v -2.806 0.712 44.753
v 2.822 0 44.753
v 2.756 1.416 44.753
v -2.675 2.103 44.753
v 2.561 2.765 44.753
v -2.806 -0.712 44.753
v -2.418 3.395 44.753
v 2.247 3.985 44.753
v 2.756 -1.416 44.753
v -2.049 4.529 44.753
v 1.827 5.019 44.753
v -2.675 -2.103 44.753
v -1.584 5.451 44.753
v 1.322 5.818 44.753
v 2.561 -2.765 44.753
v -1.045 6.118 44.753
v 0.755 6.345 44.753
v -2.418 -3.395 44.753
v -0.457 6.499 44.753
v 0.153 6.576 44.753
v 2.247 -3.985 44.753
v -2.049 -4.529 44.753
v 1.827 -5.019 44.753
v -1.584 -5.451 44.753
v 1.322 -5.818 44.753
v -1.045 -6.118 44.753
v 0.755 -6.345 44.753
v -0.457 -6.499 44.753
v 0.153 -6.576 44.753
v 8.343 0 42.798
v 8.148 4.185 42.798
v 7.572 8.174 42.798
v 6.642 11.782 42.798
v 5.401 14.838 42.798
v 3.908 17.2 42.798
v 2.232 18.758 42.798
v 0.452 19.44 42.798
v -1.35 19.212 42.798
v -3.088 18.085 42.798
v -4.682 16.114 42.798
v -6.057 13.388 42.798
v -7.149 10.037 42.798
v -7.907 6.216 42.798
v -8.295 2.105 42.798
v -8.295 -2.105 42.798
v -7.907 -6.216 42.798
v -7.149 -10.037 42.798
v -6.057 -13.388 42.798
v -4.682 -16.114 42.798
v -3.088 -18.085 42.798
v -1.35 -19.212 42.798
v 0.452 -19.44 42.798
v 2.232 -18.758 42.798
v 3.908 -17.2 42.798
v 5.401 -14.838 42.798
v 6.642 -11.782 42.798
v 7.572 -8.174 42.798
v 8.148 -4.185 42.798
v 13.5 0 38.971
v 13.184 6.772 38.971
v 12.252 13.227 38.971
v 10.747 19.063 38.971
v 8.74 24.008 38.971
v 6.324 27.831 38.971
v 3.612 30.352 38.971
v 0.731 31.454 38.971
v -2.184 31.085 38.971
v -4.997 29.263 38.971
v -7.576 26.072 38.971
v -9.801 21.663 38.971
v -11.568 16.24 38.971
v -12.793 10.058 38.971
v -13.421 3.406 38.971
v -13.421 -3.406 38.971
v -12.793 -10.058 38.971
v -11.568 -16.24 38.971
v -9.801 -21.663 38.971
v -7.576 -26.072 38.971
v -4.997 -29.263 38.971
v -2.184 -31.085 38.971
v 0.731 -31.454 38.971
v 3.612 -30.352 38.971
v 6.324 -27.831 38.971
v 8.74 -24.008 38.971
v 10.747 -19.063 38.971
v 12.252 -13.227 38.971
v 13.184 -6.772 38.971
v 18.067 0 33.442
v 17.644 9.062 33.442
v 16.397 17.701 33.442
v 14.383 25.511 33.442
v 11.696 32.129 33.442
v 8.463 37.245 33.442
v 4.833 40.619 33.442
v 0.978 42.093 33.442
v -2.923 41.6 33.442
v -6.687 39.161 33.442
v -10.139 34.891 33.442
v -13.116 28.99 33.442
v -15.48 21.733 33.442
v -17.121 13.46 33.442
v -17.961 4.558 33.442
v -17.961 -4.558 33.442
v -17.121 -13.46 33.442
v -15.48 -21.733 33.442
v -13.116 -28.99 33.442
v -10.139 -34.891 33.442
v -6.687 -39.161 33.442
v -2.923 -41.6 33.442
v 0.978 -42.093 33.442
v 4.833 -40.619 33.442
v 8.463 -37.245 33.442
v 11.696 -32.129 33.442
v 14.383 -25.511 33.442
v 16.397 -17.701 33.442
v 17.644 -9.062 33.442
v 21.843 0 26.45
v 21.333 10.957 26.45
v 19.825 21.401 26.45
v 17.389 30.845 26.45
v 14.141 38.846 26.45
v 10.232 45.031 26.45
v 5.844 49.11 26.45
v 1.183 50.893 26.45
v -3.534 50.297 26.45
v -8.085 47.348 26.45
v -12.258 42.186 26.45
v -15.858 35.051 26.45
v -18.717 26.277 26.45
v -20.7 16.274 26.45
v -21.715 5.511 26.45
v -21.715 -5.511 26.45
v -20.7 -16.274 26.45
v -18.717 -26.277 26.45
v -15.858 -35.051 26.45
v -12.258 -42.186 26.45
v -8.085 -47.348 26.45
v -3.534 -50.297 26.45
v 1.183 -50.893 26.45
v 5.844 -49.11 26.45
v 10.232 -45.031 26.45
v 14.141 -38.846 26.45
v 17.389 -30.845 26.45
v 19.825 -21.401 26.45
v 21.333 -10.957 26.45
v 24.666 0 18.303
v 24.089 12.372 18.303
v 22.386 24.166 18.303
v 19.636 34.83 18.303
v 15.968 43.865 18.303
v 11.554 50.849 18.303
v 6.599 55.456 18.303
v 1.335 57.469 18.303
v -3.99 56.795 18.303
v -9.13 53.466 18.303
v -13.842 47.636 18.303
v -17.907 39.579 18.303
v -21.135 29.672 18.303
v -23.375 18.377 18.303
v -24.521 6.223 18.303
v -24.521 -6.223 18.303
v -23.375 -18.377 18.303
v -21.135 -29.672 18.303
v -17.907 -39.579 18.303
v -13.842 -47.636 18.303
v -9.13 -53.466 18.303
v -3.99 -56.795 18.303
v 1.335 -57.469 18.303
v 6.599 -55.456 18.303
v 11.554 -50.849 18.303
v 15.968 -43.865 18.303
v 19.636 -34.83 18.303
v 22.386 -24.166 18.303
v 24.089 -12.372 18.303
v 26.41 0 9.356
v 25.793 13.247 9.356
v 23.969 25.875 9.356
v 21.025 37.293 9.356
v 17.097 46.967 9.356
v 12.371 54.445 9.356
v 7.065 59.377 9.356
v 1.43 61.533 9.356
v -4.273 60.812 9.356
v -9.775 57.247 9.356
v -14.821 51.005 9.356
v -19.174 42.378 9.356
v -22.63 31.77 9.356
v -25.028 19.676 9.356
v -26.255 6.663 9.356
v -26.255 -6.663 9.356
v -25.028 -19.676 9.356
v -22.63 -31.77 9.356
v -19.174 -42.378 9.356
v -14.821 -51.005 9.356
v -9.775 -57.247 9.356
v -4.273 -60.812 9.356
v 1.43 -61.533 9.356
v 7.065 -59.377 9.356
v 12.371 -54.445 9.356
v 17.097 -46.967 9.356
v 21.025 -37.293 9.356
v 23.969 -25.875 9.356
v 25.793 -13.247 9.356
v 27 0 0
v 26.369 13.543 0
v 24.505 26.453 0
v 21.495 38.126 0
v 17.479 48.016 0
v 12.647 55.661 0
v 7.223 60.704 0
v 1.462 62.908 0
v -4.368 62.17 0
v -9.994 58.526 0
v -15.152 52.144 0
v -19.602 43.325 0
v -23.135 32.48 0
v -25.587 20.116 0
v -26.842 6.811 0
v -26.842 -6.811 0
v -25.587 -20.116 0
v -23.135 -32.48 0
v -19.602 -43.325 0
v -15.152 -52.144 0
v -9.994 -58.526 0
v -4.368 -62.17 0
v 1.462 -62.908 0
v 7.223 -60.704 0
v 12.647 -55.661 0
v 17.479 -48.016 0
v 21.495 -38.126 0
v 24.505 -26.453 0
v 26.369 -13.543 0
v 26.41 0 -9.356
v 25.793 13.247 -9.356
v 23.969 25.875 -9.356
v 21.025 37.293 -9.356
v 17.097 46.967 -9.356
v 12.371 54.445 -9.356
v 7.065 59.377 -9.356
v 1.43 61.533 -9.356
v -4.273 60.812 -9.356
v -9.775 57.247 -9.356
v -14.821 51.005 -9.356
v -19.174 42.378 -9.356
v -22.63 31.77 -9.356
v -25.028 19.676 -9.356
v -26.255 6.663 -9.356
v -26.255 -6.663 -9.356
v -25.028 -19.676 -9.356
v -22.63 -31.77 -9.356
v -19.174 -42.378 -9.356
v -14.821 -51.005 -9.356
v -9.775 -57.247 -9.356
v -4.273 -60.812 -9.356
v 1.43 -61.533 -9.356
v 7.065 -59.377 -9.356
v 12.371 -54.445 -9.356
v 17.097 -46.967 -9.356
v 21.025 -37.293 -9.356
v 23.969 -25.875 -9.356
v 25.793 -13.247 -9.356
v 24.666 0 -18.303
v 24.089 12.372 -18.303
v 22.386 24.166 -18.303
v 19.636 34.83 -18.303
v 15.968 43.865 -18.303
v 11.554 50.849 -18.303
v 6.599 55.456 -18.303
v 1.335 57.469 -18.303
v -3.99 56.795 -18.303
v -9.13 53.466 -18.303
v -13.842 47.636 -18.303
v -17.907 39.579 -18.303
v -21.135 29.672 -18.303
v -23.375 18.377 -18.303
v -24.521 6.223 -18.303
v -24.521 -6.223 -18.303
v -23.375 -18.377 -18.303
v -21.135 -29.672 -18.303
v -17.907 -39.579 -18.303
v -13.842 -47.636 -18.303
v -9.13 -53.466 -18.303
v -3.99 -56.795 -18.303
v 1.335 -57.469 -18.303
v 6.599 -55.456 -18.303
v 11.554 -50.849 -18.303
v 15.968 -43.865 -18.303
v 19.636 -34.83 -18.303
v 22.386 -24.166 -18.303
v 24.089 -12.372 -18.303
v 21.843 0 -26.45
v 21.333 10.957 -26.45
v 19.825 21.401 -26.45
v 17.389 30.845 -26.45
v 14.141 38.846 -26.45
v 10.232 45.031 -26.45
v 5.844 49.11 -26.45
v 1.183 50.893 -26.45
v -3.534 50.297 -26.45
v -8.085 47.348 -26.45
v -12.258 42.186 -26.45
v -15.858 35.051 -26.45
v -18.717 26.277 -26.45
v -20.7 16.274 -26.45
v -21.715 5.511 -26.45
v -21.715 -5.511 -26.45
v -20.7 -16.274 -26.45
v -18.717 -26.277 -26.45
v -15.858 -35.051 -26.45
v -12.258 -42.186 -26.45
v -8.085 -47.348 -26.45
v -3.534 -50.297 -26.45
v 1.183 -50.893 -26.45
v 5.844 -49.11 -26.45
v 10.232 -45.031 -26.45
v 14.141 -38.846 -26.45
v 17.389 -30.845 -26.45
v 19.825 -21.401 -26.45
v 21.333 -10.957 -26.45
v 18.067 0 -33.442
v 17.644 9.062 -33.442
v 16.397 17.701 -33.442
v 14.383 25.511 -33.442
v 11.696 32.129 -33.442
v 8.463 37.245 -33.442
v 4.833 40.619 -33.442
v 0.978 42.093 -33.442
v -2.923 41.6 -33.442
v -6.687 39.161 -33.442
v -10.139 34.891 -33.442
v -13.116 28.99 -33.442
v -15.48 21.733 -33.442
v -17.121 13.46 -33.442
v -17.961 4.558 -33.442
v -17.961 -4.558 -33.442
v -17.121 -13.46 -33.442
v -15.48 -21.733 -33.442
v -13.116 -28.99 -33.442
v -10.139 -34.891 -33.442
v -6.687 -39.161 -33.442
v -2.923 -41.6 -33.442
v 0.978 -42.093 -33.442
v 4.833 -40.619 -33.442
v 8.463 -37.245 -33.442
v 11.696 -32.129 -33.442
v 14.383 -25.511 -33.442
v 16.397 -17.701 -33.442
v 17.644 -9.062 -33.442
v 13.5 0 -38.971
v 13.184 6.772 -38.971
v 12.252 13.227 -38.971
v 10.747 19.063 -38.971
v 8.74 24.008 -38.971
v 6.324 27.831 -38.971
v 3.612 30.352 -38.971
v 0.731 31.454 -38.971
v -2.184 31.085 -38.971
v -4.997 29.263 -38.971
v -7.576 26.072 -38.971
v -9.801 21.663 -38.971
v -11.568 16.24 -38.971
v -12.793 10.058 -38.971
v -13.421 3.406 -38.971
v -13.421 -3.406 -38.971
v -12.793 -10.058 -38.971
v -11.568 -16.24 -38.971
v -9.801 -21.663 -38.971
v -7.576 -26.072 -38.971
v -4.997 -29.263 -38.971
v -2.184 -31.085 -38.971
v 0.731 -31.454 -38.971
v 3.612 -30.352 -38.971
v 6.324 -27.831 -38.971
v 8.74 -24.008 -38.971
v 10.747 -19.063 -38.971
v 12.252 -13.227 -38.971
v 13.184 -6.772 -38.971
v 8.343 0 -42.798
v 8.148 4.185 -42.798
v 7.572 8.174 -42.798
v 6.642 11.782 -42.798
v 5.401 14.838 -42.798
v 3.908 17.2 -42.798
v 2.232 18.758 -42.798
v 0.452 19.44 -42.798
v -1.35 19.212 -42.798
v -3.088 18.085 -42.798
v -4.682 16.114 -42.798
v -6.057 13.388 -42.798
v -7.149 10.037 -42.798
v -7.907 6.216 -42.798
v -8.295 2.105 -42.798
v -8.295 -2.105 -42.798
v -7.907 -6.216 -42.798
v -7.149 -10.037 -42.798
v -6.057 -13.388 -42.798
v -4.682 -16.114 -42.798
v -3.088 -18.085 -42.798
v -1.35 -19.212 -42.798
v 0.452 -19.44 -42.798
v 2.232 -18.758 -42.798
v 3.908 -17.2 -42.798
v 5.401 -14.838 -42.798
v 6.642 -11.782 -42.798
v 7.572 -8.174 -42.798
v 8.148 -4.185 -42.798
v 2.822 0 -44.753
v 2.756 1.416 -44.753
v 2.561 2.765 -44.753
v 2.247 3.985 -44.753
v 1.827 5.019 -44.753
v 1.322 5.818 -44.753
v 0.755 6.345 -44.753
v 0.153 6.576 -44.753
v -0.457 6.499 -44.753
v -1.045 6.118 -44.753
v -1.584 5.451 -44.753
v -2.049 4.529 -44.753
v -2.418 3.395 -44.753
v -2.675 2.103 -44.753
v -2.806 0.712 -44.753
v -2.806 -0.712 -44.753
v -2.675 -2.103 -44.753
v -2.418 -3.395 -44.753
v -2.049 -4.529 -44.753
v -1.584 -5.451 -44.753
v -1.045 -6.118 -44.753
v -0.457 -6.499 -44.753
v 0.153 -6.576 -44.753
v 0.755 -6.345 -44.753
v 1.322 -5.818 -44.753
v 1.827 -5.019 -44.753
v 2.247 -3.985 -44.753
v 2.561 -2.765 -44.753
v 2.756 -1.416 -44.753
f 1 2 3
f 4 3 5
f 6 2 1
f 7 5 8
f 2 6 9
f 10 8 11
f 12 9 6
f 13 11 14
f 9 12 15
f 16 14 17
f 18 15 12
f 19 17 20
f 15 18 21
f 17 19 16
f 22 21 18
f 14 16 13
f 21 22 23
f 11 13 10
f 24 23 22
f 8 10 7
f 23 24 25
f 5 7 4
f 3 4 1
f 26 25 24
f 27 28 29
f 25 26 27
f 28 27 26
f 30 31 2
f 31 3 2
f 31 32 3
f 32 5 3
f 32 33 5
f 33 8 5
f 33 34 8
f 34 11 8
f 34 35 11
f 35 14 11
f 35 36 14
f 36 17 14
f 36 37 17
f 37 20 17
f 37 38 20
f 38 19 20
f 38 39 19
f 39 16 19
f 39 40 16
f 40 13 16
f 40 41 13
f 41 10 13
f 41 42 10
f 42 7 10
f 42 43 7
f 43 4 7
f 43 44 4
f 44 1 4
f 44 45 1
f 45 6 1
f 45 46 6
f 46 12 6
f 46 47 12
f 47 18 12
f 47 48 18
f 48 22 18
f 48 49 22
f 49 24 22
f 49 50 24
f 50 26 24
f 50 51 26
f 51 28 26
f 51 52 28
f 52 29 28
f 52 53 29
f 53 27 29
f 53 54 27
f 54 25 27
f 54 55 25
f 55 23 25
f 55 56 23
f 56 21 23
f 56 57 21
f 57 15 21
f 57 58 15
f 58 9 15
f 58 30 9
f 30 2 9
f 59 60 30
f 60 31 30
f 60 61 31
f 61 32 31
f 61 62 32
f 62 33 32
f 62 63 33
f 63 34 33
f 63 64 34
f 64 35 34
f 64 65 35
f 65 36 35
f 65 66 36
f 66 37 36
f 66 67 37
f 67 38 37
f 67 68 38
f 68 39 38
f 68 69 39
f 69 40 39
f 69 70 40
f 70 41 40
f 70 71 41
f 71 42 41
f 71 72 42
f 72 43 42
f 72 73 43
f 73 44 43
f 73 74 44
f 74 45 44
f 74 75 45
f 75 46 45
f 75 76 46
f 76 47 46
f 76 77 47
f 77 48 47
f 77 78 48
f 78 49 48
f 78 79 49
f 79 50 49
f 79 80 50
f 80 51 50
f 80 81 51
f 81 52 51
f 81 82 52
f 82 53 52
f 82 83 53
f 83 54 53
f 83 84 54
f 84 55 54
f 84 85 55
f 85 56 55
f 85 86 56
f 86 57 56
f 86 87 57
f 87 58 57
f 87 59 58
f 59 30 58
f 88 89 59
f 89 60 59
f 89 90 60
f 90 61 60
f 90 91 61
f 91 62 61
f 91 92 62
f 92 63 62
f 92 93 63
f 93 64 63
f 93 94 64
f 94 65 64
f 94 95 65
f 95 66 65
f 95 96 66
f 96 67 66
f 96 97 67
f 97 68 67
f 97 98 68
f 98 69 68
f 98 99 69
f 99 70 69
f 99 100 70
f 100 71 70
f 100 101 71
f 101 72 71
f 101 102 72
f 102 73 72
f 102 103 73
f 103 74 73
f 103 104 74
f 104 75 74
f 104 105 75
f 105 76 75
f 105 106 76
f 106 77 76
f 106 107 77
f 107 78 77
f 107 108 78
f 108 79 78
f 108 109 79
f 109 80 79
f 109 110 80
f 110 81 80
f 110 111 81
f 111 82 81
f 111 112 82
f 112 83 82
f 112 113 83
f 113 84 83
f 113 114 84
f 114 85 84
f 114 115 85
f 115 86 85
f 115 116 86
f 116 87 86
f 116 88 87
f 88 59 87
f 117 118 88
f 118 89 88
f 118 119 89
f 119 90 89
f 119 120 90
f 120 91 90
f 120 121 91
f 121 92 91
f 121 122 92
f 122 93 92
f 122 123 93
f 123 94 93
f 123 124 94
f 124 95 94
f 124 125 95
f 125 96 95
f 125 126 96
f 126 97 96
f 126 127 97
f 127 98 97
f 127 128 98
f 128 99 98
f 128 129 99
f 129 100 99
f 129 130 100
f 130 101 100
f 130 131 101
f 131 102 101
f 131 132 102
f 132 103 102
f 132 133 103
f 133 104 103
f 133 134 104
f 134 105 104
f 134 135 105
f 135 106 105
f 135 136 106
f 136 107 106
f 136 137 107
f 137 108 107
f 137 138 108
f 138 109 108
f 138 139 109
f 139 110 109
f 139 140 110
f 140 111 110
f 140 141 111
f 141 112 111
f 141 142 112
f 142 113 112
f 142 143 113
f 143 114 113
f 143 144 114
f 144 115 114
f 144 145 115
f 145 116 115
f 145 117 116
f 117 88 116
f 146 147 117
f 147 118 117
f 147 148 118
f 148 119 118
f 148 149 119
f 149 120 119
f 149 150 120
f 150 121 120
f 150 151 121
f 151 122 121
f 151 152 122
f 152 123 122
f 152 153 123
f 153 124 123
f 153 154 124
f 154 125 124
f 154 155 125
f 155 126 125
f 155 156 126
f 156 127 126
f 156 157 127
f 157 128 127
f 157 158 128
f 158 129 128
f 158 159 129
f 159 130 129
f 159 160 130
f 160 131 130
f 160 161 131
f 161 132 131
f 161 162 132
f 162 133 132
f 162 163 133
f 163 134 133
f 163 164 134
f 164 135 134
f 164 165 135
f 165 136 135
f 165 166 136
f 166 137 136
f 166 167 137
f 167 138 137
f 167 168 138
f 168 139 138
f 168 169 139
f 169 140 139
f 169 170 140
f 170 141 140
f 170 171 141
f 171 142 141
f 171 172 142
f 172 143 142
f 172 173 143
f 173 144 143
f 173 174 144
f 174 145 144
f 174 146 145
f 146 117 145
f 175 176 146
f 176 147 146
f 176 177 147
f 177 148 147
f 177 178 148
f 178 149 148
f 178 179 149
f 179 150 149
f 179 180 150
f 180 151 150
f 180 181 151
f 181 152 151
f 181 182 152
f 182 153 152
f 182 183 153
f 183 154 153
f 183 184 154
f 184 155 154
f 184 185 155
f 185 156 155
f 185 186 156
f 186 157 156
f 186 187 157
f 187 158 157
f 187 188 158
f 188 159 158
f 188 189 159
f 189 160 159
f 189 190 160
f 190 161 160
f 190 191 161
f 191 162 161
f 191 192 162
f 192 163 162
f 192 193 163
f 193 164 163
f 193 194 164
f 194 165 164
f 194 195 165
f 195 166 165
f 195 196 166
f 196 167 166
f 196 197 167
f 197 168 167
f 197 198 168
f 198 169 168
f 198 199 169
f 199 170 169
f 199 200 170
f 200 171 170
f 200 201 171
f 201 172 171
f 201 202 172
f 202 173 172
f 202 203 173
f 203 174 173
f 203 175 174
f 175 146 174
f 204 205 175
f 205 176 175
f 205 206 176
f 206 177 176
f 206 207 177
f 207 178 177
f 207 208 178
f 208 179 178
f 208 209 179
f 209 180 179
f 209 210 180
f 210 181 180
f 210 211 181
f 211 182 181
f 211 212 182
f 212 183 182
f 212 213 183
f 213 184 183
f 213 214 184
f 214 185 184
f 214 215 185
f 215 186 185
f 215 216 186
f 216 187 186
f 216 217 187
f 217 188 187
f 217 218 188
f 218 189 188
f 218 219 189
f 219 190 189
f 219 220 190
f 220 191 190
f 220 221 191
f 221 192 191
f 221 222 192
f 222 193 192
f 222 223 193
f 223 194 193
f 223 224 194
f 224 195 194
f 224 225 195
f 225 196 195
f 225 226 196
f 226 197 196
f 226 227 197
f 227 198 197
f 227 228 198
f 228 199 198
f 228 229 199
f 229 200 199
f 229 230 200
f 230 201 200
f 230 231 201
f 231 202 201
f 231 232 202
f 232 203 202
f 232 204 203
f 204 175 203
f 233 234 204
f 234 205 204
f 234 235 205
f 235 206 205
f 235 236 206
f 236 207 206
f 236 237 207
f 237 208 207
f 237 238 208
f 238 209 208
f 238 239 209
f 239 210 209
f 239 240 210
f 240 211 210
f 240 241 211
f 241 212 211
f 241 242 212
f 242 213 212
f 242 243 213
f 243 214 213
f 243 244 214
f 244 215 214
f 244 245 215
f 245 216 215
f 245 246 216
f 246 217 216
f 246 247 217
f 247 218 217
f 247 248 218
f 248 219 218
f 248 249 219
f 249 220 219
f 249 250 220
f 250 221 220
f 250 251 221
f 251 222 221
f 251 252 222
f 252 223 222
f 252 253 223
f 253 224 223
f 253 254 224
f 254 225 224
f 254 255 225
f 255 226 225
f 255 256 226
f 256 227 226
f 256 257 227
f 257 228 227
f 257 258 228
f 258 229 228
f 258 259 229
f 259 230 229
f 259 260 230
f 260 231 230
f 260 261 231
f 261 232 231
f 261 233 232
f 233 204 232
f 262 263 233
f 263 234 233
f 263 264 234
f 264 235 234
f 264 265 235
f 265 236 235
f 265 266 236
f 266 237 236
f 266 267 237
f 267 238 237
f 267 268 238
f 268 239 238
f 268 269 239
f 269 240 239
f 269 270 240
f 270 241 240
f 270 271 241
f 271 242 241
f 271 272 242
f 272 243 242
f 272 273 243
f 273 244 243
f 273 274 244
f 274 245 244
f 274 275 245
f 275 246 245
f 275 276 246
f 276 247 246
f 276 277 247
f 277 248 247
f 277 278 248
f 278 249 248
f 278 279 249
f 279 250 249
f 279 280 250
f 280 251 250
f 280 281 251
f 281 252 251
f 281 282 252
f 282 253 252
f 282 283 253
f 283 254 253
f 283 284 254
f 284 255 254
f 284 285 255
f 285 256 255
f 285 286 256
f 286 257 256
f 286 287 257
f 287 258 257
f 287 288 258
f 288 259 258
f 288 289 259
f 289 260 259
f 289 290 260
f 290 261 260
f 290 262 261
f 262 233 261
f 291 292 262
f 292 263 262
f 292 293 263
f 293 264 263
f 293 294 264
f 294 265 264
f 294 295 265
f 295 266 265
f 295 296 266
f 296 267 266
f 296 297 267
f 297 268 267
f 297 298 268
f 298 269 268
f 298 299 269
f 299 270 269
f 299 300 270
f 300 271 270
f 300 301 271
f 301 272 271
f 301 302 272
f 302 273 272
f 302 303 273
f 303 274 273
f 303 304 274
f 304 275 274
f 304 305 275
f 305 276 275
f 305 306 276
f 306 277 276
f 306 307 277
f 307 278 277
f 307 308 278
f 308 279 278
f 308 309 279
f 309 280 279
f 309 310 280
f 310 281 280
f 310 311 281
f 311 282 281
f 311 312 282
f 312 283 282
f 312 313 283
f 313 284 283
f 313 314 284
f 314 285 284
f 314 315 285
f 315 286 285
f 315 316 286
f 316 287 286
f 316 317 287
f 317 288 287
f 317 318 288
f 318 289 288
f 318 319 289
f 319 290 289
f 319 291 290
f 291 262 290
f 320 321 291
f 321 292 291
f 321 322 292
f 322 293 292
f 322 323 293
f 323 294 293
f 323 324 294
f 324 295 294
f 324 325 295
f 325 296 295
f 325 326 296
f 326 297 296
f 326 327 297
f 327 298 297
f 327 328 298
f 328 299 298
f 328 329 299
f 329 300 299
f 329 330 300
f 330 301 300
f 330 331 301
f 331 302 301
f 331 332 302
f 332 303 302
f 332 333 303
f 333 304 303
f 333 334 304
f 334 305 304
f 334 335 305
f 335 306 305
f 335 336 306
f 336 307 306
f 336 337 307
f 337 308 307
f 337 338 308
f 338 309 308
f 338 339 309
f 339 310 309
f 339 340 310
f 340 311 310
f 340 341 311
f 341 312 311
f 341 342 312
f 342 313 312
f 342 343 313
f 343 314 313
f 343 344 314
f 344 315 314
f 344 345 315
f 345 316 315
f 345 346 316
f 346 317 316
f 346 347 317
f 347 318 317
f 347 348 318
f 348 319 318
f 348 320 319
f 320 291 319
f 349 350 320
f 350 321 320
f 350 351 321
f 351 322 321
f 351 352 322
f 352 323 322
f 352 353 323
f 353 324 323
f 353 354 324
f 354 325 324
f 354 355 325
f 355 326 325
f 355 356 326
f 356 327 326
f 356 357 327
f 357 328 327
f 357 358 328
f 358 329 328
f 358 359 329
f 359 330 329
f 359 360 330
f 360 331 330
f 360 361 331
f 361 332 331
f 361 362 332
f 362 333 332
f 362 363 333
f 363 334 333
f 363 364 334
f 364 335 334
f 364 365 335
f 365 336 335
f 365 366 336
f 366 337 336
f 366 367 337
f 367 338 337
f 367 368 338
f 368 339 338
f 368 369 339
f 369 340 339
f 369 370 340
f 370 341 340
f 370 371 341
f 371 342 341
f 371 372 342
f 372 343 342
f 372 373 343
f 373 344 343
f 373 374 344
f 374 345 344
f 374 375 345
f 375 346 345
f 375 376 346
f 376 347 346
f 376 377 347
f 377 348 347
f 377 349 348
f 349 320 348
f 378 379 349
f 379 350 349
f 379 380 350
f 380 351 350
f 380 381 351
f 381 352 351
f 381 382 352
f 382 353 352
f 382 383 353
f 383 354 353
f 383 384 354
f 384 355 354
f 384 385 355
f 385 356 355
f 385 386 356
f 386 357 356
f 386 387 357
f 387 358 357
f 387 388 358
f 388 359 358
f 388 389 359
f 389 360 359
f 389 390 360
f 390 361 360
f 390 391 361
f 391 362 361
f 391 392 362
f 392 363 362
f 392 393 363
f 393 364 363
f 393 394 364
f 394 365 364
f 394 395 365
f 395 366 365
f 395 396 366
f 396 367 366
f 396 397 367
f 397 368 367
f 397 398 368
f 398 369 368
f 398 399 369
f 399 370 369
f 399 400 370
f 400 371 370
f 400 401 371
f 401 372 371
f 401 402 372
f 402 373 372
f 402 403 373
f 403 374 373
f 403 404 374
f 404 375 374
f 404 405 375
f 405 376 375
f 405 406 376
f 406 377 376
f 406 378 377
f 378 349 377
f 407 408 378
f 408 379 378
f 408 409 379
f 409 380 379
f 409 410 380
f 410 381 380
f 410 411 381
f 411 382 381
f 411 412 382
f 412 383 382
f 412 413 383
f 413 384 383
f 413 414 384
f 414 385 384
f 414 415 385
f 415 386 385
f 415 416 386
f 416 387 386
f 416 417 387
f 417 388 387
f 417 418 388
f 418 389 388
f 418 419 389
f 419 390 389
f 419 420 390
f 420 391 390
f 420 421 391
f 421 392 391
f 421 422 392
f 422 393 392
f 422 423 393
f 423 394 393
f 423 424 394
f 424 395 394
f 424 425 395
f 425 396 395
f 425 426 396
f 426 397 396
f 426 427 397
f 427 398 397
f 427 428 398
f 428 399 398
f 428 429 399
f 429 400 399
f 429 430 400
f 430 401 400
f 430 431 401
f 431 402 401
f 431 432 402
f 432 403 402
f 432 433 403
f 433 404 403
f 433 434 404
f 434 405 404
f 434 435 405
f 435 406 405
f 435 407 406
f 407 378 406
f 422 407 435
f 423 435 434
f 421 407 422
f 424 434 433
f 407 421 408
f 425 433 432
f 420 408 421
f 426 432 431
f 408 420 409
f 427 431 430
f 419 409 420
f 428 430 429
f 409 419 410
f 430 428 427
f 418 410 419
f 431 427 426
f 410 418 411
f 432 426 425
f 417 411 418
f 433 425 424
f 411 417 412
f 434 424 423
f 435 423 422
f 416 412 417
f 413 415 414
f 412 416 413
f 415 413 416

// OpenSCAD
// Generated by SolidPython 1.0.1 on 2020-07-29 00:46:45


scale(v = [3, 7, 5]) {
	sphere(r = 9);
}
/***********************************************
*********      SolidPython code:      **********
************************************************
 
# import packages: SolidPython
from solid import *
from solid.utils import *
from itertools import chain, combinations, permutations


class Resize:

    def __init__(self, scad_file):
        self.scad_file = scad_file
        #self.scad_file = import_scad(scad_file)
        # cone/cylinder param:
        self.r1 = 0
        self.r2 = 0
        self.h = 0
        # rectangular prism param:
        self.w = 0
        self.l = 0
        # ellipse param:
        self.r = 0

    # import OpenScad code (file name corresponds to shape)


    # classify shape + parameters
    def assign(self, param1, param2, param3):
        if self.scad_file == 'cone.scad':
            self.r1 = param1
            self.r2 = param2
            self.h = param3
        elif self.scad_file == 'cylinder.scad':
            self.r1 = param1
            self.r2 = param2
            self.h = param3
        elif self.scad_file == 'rectangularPrism.scad':
            self.h = param1
            self.l = param2
            self.w = param3
        else:
            self.r = param1
            self.h = param2

    # resize parameters
    def iterate(self):
        x = range(3, 20, 2)
        i = 1
        if self.scad_file == 'cone.scad':
            tempList = list(permutations(x, 2))
            for temp in tempList:
                param1 = temp[0]
                param2 = temp[1]
                filepath = 'produced_scad_files/' + 'cone' + str(param1) + '_' + str(param2) + '_' + '.scad'
                scad_render_to_file(cylinder(h=param1, r1=param2, r2=0), filepath)

        elif self.scad_file == 'cylinder.scad':
            tempList = list(permutations(x, 3))
            for temp in tempList:
                param1 = temp[0]
                param2 = temp[1]
                filepath = 'produced_scad_files/' + 'cylinder' + str(param1) + '_' + str(param2) + '_' + '.scad'
                scad_render_to_file(cylinder(h=param1, r1=param2, r2=param2), filepath)

        elif self.scad_file == 'rectangularPrism.scad':
            tempList = list(permutations(x, 3))
            for temp in tempList:
                param1 = temp[0]
                param2 = temp[1]
                param3 = temp[2]
                filepath = 'produced_scad_files/' + 'rectangularPrism' + str(param1) + '_' + str(param2) + '_' + str(
                    param3) + '.scad'
                scad_render_to_file(cube(size=(param1, param2, param3)), filepath)

        elif self.scad_file == 'ellipse.scad':
            tempList = list(permutations(x, 4))
            for temp in tempList:
                param1 = temp[0]
                param2 = temp[1]
                param3 = temp[2]
                param4 = temp[3]
                filepath = 'produced_scad_files/' + 'ellipse' + str(param1) + '_' + str(param2) + '_' + str(param3) + '_' + str(param4) + '.scad'
                scad_render_to_file(scale([param1, param2, param3])(sphere(r=param4)), filepath)

    def render_to_scadfile(self):
        scad_render_to_file(scad, 'example.scad') 
 
************************************************/
